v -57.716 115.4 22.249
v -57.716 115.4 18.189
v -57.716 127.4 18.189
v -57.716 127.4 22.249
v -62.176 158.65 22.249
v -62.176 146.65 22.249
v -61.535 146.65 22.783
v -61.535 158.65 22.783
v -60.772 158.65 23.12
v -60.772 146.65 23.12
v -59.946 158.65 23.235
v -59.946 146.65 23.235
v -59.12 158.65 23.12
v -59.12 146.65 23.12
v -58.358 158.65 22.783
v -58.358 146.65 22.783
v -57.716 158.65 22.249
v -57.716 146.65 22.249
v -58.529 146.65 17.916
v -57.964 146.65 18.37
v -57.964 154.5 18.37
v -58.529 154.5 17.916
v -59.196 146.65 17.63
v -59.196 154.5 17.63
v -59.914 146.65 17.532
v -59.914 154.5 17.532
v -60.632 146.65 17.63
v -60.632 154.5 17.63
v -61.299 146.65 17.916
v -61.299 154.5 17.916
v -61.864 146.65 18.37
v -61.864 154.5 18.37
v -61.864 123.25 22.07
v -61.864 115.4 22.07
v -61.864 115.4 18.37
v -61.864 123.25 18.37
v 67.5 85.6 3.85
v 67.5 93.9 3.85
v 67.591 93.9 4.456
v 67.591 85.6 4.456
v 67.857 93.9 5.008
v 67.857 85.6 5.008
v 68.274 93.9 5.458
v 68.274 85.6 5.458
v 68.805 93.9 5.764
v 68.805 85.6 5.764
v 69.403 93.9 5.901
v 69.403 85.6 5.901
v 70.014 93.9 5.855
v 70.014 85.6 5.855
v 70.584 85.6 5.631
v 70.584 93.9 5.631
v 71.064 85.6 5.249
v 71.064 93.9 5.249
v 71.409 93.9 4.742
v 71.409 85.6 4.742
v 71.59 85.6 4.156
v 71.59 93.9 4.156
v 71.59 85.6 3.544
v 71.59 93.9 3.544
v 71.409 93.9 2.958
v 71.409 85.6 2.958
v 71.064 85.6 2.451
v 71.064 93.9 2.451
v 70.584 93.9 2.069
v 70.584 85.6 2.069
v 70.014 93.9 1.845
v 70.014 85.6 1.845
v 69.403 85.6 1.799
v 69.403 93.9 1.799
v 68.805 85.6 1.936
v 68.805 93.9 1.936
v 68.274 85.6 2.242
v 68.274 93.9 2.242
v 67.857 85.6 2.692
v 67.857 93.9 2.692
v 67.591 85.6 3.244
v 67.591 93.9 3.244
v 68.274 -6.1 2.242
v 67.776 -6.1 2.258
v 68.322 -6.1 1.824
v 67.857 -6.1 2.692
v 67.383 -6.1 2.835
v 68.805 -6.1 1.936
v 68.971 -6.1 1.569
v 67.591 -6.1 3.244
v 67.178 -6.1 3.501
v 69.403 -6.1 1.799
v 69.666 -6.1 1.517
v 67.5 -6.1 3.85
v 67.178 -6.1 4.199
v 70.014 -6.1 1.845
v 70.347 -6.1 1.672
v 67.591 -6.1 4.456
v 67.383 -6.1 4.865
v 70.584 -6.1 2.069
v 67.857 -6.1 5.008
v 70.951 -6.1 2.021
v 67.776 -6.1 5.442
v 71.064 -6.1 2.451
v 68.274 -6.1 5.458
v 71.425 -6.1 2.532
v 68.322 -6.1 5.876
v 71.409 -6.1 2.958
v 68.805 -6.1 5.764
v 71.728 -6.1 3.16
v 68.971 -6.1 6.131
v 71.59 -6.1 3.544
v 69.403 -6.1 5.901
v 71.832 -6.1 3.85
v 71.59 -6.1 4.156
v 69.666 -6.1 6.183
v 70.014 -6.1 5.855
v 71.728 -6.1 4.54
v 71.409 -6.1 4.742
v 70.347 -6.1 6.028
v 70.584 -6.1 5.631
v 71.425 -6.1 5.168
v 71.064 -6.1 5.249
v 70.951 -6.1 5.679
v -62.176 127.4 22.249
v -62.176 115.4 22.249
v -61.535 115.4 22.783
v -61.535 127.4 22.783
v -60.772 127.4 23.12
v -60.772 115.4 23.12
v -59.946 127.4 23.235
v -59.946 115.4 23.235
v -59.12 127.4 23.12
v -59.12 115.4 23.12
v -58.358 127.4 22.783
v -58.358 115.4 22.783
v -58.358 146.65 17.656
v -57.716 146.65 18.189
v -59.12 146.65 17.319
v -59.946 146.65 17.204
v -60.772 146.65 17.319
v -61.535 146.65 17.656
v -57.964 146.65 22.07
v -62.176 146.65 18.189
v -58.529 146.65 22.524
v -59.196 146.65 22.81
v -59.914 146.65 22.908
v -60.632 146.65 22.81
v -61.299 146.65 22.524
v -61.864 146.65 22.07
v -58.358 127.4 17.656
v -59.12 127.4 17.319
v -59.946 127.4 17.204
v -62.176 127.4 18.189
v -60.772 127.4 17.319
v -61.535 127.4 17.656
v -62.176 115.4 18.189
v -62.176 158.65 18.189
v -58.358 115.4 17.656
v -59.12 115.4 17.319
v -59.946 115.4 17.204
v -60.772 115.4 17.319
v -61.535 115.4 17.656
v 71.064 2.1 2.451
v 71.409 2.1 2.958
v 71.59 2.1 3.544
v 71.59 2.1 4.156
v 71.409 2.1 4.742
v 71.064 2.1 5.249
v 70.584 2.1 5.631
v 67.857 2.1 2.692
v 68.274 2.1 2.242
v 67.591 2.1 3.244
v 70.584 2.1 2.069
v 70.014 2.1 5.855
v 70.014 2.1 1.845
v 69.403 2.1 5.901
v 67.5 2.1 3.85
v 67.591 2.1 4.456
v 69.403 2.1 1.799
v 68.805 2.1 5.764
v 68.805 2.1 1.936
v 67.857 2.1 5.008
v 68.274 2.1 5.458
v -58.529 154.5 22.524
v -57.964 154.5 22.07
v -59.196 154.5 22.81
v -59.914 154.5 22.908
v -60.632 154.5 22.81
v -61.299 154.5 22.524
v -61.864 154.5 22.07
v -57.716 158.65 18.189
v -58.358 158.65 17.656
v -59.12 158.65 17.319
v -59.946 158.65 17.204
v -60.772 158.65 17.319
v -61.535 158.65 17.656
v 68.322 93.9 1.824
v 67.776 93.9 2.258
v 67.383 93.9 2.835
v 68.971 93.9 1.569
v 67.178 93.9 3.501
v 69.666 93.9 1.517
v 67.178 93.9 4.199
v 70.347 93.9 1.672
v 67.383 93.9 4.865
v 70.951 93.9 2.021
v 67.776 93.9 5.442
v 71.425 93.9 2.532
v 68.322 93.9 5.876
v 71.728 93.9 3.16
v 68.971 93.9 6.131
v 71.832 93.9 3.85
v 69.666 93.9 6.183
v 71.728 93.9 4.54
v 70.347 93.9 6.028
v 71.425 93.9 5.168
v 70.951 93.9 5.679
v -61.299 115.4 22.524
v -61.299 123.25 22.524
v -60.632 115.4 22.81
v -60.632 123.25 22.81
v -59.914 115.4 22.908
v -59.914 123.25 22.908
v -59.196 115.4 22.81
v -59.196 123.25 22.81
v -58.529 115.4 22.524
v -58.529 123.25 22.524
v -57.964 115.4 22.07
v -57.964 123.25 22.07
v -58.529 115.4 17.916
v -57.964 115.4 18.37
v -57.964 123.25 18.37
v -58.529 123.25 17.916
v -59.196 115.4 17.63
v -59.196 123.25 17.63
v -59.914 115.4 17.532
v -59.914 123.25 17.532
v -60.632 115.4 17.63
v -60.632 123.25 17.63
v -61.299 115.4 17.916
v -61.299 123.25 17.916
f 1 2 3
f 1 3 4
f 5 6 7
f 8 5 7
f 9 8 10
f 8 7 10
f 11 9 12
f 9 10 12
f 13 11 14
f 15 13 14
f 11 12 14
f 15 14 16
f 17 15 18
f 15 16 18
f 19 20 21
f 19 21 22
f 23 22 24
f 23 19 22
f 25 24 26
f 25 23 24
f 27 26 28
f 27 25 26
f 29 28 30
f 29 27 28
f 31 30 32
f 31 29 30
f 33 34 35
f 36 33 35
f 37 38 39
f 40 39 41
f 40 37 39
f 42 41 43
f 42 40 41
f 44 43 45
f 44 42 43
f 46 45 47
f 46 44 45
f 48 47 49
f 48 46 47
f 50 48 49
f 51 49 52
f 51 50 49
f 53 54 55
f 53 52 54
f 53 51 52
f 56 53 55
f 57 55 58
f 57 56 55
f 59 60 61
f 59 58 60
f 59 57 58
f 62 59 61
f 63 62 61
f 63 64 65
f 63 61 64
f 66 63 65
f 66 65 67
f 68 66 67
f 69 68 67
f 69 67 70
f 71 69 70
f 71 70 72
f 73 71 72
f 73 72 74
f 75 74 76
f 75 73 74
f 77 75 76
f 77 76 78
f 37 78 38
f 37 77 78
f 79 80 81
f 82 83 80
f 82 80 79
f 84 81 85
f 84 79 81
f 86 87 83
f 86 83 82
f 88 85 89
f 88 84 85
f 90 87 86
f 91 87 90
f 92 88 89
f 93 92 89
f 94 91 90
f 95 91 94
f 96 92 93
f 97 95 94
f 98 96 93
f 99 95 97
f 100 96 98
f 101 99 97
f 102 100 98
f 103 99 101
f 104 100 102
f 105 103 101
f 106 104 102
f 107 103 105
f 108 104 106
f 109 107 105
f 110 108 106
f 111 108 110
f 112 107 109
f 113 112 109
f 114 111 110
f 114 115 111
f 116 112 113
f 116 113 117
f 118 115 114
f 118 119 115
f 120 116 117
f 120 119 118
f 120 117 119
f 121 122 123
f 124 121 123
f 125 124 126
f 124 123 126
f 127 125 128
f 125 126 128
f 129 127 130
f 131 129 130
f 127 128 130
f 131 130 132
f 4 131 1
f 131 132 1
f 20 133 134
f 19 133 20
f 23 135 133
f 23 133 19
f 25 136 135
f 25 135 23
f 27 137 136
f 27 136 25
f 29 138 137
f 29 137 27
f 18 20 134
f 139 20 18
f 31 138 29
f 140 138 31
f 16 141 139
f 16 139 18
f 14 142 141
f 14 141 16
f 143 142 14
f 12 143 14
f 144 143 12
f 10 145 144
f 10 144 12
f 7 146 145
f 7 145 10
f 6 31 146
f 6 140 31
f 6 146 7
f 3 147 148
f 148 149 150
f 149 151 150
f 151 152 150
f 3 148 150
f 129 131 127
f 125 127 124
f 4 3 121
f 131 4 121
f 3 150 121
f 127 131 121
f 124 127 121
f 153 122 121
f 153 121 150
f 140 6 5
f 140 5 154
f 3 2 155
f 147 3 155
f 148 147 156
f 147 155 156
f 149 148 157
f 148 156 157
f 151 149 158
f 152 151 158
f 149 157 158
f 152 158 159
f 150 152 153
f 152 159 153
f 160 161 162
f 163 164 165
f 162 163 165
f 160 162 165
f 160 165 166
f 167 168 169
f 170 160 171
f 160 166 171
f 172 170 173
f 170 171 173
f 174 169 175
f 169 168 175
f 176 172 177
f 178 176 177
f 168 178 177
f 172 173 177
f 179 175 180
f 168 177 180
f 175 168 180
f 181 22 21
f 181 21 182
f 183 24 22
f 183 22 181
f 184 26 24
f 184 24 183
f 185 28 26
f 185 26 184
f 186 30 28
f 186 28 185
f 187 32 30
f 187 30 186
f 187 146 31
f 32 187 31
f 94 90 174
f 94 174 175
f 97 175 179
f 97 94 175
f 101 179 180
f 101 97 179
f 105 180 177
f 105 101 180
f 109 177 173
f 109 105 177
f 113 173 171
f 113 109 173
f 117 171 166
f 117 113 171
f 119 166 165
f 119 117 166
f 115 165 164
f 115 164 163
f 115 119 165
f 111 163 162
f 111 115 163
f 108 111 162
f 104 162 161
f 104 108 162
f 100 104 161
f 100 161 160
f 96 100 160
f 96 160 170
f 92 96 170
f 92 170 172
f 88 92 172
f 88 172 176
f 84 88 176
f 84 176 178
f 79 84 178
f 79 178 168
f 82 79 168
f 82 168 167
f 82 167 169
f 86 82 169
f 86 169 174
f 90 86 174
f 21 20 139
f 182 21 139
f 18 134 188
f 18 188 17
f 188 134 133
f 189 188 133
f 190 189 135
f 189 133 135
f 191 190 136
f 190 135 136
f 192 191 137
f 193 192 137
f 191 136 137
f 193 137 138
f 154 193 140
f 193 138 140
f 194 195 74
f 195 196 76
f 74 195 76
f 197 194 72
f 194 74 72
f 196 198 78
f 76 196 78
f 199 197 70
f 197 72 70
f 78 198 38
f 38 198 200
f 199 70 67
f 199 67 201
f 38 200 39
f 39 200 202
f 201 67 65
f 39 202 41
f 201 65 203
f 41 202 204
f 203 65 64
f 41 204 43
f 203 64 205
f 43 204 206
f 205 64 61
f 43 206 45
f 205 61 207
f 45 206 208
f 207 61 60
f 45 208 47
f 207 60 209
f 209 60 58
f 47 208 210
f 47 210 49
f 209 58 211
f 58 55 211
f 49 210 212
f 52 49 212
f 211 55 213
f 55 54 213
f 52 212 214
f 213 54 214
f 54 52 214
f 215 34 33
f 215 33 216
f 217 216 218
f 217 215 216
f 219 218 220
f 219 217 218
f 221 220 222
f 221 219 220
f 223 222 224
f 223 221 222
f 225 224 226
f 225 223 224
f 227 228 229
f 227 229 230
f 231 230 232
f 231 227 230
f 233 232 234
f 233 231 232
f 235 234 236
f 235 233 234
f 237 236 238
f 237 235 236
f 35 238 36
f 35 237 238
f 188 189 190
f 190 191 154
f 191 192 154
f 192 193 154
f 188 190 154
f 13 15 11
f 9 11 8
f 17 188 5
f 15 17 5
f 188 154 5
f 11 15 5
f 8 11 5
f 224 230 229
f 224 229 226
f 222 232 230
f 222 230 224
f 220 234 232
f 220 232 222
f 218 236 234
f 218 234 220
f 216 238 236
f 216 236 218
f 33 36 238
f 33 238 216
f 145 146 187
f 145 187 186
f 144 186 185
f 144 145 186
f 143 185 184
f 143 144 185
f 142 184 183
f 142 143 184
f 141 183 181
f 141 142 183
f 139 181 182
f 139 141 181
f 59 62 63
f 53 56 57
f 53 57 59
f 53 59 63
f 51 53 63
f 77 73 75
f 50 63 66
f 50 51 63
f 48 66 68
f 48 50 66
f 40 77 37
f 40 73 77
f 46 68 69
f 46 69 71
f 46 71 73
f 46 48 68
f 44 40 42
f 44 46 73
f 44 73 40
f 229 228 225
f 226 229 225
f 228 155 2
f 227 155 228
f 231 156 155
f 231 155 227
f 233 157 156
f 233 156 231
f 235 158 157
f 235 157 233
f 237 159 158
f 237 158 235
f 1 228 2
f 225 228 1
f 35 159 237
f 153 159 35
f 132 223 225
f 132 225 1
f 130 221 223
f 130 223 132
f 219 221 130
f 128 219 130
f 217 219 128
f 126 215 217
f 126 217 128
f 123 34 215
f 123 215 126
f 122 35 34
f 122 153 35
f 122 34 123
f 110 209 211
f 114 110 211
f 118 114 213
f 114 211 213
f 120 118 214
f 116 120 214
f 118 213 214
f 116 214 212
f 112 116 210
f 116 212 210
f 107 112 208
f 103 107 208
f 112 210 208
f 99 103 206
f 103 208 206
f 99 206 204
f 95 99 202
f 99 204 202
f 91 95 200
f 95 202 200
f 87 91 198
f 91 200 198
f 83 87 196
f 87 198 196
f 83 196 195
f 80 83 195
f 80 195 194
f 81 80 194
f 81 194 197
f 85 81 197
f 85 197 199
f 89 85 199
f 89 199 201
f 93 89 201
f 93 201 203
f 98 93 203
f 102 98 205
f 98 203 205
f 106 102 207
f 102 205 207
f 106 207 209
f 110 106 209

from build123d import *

# Parameters (mm, degrees)
SKETCH165_R                = 2.05629
EXTRUDE184_DEPTH           = 10
SKETCH168_R                = 2.05629
EXTRUDE187_DEPTH           = 10
SKETCH167_R                = 2.34
EXTRUDE186_DEPTH           = 100
EXTRUDE186_PLACEMENT_ANGLE = 90
EXTRUDE191_DEPTH           = 40
EXTRUDE191_PLACEMENT_ANGLE = 90
EXTRUDE188_DEPTH           = 12
EXTRUDE188_PLACEMENT_ANGLE = 90
EXTRUDE197_DEPTH           = 40
EXTRUDE197_PLACEMENT_ANGLE = 90
EXTRUDE196_DEPTH           = 12
EXTRUDE196_PLACEMENT_ANGLE = 90


with BuildPart() as extrude184:
    # Sketch165 → Extrude184 (new body)
    with BuildSketch(Plane(origin=(97.5, 93.9, -16.15), x_dir=(-1, 0, 0), z_dir=(0, 1, 0))):
        with Locations((27.94371, 20)):
            Circle(SKETCH165_R)
    extrude(amount=EXTRUDE184_DEPTH)


with BuildPart() as extrude184_1:
    # Extrude184 placement: moved
    add(extrude184.part.moved(Location((0, -8.3, 0))))


with BuildPart() as extrude187:
    # Sketch168 (on Face2 of Extrude186) → Extrude187 (new body)
    with BuildSketch(Plane(origin=(97.5, 93.9, -16.15), x_dir=(-1, 0, 0), z_dir=(0, 1, 0))):
        with Locations((27.94371, 20)):
            Circle(SKETCH168_R)
    extrude(amount=EXTRUDE187_DEPTH)


with BuildPart() as extrude187_1:
    # Extrude187 placement: moved
    add(extrude187.part.moved(Location((0, -101.8, 0))))


with BuildPart() as tubo:
    # Sketch167 → Extrude186 (new body)
    with BuildSketch(Plane(origin=(-101, -107, 0), x_dir=(0, -1, 0), z_dir=(-1, 0, 0))):
        with Locations((-135.008375, 20)):
            Circle(SKETCH167_R)
    extrude(amount=EXTRUDE186_DEPTH)


with BuildPart() as tubo_1:
    # Extrude186 placement: moved
    add(tubo.part.moved(Location((97.5, 194.9, -16.15))).rotate(Axis((97.5, 194.9, -16.15), (0, 0, 1)), EXTRUDE186_PLACEMENT_ANGLE))

    # Cut108: cut Extrude187
    add(extrude187_1.part, mode=Mode.SUBTRACT)

    # Cut109: cut Extrude184
    add(extrude184_1.part, mode=Mode.SUBTRACT)


with BuildPart() as pieza_clave_motor013:
    # Sketch174 → Extrude191 (new body)
    with BuildSketch(Plane(origin=(0, -17.4, 11), x_dir=(-1, 0, 0), z_dir=(0, 1, 0))):
        with BuildLine():
            Line((-1.85, -8.976057), (1.85, -8.976057))
            ThreePointArc((1.85, -12.876057), (2.687936, -10.926057), (1.85, -8.976057))
            Line((1.85, -12.876057), (-1.85, -12.876057))
            ThreePointArc((-1.85, -8.976057), (-2.687936, -10.926057), (-1.85, -12.876057))
        make_face()
    extrude(amount=EXTRUDE191_DEPTH)


with BuildPart() as pieza_clave_motor013_1:
    # Extrude191 placement: moved
    add(pieza_clave_motor013.part.moved(Location((-59.84, 131.9, 20.22))).rotate(Axis((-59.84, 131.9, 20.22), (0, -1, 0)), EXTRUDE191_PLACEMENT_ANGLE))


with BuildPart() as cut:
    # Sketch169 → Extrude188 (new body)
    with BuildSketch(Plane(origin=(0, -17.4, 11), x_dir=(-1, 0, 0), z_dir=(0, 1, 0))):
        with BuildLine():
            Line((-2.03, -8.748735), (2.03, -8.748735))
            ThreePointArc((2.03, -13.208735), (3.015593, -10.978735), (2.03, -8.748735))
            Line((2.03, -13.208735), (-2.03, -13.208735))
            ThreePointArc((-2.03, -8.748735), (-3.015593, -10.978735), (-2.03, -13.208735))
        make_face()
    extrude(amount=EXTRUDE188_DEPTH)


with BuildPart() as cut_1:
    # Extrude188 placement: moved
    add(cut.part.moved(Location((-59.925037, 164.05, 20.219402))).rotate(Axis((-59.925037, 164.05, 20.219402), (0, -1, 0)), EXTRUDE188_PLACEMENT_ANGLE))

    # Cut: cut Pieza Clave motor013
    add(pieza_clave_motor013_1.part, mode=Mode.SUBTRACT)


with BuildPart() as cut_2:
    # Cut placement: moved
    add(cut_1.part.moved(Location((0, -31.25, 0))))


with BuildPart() as pieza_clave_motor019:
    # Sketch180 → Extrude197 (new body)
    with BuildSketch(Plane(origin=(0, -17.4, 11), x_dir=(-1, 0, 0), z_dir=(0, 1, 0))):
        with BuildLine():
            Line((-1.85, -8.976057), (1.85, -8.976057))
            ThreePointArc((1.85, -12.876057), (2.687936, -10.926057), (1.85, -8.976057))
            Line((1.85, -12.876057), (-1.85, -12.876057))
            ThreePointArc((-1.85, -8.976057), (-2.687936, -10.926057), (-1.85, -12.876057))
        make_face()
    extrude(amount=EXTRUDE197_DEPTH)


with BuildPart() as pieza_clave_motor019_1:
    # Extrude197 placement: moved
    add(pieza_clave_motor019.part.moved(Location((-59.84, 131.9, 20.22))).rotate(Axis((-59.84, 131.9, 20.22), (0, -1, 0)), EXTRUDE197_PLACEMENT_ANGLE))


with BuildPart() as cut111:
    # Sketch179 → Extrude196 (new body)
    with BuildSketch(Plane(origin=(0, -17.4, 11), x_dir=(-1, 0, 0), z_dir=(0, 1, 0))):
        with BuildLine():
            Line((-2.03, -8.748735), (2.03, -8.748735))
            ThreePointArc((2.03, -13.208735), (3.015593, -10.978735), (2.03, -8.748735))
            Line((2.03, -13.208735), (-2.03, -13.208735))
            ThreePointArc((-2.03, -8.748735), (-3.015593, -10.978735), (-2.03, -13.208735))
        make_face()
    extrude(amount=EXTRUDE196_DEPTH)


with BuildPart() as cut111_1:
    # Extrude196 placement: moved
    add(cut111.part.moved(Location((-59.925037, 164.05, 20.219402))).rotate(Axis((-59.925037, 164.05, 20.219402), (0, -1, 0)), EXTRUDE196_PLACEMENT_ANGLE))

    # Cut111: cut Pieza Clave motor019
    add(pieza_clave_motor019_1.part, mode=Mode.SUBTRACT)


solid = Compound([tubo_1.part, cut_2.part, cut111_1.part])
